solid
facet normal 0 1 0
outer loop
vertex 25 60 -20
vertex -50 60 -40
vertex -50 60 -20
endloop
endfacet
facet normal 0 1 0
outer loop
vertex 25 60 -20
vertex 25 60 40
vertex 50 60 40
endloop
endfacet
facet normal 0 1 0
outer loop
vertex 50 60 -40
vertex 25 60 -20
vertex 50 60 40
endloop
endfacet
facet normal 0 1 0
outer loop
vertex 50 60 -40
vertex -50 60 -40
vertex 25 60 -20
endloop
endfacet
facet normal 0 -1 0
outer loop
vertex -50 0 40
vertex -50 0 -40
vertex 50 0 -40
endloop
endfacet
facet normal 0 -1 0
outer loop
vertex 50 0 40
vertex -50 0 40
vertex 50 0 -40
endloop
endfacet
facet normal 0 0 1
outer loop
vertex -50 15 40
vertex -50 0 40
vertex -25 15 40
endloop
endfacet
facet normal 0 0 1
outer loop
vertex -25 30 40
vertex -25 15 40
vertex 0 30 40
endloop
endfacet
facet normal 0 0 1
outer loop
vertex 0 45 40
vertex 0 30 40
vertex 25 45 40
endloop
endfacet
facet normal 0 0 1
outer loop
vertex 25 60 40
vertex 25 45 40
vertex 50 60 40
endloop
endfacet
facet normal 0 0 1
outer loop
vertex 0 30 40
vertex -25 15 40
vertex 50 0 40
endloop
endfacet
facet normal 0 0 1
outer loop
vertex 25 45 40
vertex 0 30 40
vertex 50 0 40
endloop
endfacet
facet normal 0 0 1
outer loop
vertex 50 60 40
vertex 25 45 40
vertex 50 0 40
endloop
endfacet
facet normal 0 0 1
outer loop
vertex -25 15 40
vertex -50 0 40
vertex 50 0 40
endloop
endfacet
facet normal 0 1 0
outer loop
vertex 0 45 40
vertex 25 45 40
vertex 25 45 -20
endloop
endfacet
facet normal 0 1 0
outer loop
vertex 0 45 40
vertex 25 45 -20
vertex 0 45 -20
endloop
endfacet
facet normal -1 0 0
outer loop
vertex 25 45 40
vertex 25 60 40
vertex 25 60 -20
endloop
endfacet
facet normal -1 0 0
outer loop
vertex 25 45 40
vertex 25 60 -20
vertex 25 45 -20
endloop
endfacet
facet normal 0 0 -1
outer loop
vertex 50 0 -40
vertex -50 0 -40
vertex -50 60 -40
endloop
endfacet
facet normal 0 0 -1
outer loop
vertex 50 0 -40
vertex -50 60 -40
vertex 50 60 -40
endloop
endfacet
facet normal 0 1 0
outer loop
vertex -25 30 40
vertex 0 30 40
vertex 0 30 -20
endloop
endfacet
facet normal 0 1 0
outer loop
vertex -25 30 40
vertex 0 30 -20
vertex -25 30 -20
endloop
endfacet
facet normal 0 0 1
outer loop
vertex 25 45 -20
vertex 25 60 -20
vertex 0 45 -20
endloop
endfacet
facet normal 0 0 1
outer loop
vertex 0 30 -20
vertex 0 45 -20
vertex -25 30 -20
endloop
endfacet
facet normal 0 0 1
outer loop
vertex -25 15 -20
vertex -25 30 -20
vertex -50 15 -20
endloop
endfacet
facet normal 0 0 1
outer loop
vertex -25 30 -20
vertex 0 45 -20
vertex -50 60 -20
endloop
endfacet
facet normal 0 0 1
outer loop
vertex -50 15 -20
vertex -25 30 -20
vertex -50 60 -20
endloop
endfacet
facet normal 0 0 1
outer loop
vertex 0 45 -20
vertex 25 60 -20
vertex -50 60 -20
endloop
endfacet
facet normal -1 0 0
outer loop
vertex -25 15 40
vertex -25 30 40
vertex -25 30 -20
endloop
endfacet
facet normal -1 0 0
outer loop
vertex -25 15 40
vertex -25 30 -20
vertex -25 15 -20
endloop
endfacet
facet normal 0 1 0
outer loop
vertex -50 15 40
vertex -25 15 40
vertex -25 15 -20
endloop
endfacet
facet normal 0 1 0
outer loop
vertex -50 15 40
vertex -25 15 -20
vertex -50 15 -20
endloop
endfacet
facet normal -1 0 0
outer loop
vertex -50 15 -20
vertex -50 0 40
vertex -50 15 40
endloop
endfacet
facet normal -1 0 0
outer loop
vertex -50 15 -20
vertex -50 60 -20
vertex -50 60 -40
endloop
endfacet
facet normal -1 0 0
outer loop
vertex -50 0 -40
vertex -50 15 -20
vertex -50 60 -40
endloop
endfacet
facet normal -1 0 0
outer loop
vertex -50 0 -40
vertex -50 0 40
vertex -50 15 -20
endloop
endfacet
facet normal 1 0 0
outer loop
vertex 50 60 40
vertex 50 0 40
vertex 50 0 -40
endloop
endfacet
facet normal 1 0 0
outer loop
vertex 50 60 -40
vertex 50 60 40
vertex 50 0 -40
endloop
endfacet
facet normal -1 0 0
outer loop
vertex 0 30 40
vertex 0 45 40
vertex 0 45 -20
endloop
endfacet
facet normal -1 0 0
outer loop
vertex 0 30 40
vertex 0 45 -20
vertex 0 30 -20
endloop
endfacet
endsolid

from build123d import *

# Parameters (mm, degrees)
SKETCH1_W           = 100
SKETCH1_H           = 80
BOSS_EXTRUDE1_DEPTH = 60
CUT_EXTRUDE1_DEPTH  = 60


with BuildPart() as part:
    # Sketch1 → Boss-Extrude1 (new body)
    with BuildSketch(Plane(origin=(0, 0, 0), x_dir=(1, 0, 0), z_dir=(0, 1, 0))):
        Rectangle(SKETCH1_W, SKETCH1_H)
    extrude(amount=BOSS_EXTRUDE1_DEPTH)

    # Sketch2 → Cut-Extrude1 (cut)
    with BuildSketch(Plane.XY.offset(40)):
        Polygon((-50, 60), (25, 60), (25, 45), (0, 45), (0, 30), (-25, 30), (-25, 15), (-50, 15), align=None)
    extrude(amount=-CUT_EXTRUDE1_DEPTH, mode=Mode.SUBTRACT)


solid = part.part
